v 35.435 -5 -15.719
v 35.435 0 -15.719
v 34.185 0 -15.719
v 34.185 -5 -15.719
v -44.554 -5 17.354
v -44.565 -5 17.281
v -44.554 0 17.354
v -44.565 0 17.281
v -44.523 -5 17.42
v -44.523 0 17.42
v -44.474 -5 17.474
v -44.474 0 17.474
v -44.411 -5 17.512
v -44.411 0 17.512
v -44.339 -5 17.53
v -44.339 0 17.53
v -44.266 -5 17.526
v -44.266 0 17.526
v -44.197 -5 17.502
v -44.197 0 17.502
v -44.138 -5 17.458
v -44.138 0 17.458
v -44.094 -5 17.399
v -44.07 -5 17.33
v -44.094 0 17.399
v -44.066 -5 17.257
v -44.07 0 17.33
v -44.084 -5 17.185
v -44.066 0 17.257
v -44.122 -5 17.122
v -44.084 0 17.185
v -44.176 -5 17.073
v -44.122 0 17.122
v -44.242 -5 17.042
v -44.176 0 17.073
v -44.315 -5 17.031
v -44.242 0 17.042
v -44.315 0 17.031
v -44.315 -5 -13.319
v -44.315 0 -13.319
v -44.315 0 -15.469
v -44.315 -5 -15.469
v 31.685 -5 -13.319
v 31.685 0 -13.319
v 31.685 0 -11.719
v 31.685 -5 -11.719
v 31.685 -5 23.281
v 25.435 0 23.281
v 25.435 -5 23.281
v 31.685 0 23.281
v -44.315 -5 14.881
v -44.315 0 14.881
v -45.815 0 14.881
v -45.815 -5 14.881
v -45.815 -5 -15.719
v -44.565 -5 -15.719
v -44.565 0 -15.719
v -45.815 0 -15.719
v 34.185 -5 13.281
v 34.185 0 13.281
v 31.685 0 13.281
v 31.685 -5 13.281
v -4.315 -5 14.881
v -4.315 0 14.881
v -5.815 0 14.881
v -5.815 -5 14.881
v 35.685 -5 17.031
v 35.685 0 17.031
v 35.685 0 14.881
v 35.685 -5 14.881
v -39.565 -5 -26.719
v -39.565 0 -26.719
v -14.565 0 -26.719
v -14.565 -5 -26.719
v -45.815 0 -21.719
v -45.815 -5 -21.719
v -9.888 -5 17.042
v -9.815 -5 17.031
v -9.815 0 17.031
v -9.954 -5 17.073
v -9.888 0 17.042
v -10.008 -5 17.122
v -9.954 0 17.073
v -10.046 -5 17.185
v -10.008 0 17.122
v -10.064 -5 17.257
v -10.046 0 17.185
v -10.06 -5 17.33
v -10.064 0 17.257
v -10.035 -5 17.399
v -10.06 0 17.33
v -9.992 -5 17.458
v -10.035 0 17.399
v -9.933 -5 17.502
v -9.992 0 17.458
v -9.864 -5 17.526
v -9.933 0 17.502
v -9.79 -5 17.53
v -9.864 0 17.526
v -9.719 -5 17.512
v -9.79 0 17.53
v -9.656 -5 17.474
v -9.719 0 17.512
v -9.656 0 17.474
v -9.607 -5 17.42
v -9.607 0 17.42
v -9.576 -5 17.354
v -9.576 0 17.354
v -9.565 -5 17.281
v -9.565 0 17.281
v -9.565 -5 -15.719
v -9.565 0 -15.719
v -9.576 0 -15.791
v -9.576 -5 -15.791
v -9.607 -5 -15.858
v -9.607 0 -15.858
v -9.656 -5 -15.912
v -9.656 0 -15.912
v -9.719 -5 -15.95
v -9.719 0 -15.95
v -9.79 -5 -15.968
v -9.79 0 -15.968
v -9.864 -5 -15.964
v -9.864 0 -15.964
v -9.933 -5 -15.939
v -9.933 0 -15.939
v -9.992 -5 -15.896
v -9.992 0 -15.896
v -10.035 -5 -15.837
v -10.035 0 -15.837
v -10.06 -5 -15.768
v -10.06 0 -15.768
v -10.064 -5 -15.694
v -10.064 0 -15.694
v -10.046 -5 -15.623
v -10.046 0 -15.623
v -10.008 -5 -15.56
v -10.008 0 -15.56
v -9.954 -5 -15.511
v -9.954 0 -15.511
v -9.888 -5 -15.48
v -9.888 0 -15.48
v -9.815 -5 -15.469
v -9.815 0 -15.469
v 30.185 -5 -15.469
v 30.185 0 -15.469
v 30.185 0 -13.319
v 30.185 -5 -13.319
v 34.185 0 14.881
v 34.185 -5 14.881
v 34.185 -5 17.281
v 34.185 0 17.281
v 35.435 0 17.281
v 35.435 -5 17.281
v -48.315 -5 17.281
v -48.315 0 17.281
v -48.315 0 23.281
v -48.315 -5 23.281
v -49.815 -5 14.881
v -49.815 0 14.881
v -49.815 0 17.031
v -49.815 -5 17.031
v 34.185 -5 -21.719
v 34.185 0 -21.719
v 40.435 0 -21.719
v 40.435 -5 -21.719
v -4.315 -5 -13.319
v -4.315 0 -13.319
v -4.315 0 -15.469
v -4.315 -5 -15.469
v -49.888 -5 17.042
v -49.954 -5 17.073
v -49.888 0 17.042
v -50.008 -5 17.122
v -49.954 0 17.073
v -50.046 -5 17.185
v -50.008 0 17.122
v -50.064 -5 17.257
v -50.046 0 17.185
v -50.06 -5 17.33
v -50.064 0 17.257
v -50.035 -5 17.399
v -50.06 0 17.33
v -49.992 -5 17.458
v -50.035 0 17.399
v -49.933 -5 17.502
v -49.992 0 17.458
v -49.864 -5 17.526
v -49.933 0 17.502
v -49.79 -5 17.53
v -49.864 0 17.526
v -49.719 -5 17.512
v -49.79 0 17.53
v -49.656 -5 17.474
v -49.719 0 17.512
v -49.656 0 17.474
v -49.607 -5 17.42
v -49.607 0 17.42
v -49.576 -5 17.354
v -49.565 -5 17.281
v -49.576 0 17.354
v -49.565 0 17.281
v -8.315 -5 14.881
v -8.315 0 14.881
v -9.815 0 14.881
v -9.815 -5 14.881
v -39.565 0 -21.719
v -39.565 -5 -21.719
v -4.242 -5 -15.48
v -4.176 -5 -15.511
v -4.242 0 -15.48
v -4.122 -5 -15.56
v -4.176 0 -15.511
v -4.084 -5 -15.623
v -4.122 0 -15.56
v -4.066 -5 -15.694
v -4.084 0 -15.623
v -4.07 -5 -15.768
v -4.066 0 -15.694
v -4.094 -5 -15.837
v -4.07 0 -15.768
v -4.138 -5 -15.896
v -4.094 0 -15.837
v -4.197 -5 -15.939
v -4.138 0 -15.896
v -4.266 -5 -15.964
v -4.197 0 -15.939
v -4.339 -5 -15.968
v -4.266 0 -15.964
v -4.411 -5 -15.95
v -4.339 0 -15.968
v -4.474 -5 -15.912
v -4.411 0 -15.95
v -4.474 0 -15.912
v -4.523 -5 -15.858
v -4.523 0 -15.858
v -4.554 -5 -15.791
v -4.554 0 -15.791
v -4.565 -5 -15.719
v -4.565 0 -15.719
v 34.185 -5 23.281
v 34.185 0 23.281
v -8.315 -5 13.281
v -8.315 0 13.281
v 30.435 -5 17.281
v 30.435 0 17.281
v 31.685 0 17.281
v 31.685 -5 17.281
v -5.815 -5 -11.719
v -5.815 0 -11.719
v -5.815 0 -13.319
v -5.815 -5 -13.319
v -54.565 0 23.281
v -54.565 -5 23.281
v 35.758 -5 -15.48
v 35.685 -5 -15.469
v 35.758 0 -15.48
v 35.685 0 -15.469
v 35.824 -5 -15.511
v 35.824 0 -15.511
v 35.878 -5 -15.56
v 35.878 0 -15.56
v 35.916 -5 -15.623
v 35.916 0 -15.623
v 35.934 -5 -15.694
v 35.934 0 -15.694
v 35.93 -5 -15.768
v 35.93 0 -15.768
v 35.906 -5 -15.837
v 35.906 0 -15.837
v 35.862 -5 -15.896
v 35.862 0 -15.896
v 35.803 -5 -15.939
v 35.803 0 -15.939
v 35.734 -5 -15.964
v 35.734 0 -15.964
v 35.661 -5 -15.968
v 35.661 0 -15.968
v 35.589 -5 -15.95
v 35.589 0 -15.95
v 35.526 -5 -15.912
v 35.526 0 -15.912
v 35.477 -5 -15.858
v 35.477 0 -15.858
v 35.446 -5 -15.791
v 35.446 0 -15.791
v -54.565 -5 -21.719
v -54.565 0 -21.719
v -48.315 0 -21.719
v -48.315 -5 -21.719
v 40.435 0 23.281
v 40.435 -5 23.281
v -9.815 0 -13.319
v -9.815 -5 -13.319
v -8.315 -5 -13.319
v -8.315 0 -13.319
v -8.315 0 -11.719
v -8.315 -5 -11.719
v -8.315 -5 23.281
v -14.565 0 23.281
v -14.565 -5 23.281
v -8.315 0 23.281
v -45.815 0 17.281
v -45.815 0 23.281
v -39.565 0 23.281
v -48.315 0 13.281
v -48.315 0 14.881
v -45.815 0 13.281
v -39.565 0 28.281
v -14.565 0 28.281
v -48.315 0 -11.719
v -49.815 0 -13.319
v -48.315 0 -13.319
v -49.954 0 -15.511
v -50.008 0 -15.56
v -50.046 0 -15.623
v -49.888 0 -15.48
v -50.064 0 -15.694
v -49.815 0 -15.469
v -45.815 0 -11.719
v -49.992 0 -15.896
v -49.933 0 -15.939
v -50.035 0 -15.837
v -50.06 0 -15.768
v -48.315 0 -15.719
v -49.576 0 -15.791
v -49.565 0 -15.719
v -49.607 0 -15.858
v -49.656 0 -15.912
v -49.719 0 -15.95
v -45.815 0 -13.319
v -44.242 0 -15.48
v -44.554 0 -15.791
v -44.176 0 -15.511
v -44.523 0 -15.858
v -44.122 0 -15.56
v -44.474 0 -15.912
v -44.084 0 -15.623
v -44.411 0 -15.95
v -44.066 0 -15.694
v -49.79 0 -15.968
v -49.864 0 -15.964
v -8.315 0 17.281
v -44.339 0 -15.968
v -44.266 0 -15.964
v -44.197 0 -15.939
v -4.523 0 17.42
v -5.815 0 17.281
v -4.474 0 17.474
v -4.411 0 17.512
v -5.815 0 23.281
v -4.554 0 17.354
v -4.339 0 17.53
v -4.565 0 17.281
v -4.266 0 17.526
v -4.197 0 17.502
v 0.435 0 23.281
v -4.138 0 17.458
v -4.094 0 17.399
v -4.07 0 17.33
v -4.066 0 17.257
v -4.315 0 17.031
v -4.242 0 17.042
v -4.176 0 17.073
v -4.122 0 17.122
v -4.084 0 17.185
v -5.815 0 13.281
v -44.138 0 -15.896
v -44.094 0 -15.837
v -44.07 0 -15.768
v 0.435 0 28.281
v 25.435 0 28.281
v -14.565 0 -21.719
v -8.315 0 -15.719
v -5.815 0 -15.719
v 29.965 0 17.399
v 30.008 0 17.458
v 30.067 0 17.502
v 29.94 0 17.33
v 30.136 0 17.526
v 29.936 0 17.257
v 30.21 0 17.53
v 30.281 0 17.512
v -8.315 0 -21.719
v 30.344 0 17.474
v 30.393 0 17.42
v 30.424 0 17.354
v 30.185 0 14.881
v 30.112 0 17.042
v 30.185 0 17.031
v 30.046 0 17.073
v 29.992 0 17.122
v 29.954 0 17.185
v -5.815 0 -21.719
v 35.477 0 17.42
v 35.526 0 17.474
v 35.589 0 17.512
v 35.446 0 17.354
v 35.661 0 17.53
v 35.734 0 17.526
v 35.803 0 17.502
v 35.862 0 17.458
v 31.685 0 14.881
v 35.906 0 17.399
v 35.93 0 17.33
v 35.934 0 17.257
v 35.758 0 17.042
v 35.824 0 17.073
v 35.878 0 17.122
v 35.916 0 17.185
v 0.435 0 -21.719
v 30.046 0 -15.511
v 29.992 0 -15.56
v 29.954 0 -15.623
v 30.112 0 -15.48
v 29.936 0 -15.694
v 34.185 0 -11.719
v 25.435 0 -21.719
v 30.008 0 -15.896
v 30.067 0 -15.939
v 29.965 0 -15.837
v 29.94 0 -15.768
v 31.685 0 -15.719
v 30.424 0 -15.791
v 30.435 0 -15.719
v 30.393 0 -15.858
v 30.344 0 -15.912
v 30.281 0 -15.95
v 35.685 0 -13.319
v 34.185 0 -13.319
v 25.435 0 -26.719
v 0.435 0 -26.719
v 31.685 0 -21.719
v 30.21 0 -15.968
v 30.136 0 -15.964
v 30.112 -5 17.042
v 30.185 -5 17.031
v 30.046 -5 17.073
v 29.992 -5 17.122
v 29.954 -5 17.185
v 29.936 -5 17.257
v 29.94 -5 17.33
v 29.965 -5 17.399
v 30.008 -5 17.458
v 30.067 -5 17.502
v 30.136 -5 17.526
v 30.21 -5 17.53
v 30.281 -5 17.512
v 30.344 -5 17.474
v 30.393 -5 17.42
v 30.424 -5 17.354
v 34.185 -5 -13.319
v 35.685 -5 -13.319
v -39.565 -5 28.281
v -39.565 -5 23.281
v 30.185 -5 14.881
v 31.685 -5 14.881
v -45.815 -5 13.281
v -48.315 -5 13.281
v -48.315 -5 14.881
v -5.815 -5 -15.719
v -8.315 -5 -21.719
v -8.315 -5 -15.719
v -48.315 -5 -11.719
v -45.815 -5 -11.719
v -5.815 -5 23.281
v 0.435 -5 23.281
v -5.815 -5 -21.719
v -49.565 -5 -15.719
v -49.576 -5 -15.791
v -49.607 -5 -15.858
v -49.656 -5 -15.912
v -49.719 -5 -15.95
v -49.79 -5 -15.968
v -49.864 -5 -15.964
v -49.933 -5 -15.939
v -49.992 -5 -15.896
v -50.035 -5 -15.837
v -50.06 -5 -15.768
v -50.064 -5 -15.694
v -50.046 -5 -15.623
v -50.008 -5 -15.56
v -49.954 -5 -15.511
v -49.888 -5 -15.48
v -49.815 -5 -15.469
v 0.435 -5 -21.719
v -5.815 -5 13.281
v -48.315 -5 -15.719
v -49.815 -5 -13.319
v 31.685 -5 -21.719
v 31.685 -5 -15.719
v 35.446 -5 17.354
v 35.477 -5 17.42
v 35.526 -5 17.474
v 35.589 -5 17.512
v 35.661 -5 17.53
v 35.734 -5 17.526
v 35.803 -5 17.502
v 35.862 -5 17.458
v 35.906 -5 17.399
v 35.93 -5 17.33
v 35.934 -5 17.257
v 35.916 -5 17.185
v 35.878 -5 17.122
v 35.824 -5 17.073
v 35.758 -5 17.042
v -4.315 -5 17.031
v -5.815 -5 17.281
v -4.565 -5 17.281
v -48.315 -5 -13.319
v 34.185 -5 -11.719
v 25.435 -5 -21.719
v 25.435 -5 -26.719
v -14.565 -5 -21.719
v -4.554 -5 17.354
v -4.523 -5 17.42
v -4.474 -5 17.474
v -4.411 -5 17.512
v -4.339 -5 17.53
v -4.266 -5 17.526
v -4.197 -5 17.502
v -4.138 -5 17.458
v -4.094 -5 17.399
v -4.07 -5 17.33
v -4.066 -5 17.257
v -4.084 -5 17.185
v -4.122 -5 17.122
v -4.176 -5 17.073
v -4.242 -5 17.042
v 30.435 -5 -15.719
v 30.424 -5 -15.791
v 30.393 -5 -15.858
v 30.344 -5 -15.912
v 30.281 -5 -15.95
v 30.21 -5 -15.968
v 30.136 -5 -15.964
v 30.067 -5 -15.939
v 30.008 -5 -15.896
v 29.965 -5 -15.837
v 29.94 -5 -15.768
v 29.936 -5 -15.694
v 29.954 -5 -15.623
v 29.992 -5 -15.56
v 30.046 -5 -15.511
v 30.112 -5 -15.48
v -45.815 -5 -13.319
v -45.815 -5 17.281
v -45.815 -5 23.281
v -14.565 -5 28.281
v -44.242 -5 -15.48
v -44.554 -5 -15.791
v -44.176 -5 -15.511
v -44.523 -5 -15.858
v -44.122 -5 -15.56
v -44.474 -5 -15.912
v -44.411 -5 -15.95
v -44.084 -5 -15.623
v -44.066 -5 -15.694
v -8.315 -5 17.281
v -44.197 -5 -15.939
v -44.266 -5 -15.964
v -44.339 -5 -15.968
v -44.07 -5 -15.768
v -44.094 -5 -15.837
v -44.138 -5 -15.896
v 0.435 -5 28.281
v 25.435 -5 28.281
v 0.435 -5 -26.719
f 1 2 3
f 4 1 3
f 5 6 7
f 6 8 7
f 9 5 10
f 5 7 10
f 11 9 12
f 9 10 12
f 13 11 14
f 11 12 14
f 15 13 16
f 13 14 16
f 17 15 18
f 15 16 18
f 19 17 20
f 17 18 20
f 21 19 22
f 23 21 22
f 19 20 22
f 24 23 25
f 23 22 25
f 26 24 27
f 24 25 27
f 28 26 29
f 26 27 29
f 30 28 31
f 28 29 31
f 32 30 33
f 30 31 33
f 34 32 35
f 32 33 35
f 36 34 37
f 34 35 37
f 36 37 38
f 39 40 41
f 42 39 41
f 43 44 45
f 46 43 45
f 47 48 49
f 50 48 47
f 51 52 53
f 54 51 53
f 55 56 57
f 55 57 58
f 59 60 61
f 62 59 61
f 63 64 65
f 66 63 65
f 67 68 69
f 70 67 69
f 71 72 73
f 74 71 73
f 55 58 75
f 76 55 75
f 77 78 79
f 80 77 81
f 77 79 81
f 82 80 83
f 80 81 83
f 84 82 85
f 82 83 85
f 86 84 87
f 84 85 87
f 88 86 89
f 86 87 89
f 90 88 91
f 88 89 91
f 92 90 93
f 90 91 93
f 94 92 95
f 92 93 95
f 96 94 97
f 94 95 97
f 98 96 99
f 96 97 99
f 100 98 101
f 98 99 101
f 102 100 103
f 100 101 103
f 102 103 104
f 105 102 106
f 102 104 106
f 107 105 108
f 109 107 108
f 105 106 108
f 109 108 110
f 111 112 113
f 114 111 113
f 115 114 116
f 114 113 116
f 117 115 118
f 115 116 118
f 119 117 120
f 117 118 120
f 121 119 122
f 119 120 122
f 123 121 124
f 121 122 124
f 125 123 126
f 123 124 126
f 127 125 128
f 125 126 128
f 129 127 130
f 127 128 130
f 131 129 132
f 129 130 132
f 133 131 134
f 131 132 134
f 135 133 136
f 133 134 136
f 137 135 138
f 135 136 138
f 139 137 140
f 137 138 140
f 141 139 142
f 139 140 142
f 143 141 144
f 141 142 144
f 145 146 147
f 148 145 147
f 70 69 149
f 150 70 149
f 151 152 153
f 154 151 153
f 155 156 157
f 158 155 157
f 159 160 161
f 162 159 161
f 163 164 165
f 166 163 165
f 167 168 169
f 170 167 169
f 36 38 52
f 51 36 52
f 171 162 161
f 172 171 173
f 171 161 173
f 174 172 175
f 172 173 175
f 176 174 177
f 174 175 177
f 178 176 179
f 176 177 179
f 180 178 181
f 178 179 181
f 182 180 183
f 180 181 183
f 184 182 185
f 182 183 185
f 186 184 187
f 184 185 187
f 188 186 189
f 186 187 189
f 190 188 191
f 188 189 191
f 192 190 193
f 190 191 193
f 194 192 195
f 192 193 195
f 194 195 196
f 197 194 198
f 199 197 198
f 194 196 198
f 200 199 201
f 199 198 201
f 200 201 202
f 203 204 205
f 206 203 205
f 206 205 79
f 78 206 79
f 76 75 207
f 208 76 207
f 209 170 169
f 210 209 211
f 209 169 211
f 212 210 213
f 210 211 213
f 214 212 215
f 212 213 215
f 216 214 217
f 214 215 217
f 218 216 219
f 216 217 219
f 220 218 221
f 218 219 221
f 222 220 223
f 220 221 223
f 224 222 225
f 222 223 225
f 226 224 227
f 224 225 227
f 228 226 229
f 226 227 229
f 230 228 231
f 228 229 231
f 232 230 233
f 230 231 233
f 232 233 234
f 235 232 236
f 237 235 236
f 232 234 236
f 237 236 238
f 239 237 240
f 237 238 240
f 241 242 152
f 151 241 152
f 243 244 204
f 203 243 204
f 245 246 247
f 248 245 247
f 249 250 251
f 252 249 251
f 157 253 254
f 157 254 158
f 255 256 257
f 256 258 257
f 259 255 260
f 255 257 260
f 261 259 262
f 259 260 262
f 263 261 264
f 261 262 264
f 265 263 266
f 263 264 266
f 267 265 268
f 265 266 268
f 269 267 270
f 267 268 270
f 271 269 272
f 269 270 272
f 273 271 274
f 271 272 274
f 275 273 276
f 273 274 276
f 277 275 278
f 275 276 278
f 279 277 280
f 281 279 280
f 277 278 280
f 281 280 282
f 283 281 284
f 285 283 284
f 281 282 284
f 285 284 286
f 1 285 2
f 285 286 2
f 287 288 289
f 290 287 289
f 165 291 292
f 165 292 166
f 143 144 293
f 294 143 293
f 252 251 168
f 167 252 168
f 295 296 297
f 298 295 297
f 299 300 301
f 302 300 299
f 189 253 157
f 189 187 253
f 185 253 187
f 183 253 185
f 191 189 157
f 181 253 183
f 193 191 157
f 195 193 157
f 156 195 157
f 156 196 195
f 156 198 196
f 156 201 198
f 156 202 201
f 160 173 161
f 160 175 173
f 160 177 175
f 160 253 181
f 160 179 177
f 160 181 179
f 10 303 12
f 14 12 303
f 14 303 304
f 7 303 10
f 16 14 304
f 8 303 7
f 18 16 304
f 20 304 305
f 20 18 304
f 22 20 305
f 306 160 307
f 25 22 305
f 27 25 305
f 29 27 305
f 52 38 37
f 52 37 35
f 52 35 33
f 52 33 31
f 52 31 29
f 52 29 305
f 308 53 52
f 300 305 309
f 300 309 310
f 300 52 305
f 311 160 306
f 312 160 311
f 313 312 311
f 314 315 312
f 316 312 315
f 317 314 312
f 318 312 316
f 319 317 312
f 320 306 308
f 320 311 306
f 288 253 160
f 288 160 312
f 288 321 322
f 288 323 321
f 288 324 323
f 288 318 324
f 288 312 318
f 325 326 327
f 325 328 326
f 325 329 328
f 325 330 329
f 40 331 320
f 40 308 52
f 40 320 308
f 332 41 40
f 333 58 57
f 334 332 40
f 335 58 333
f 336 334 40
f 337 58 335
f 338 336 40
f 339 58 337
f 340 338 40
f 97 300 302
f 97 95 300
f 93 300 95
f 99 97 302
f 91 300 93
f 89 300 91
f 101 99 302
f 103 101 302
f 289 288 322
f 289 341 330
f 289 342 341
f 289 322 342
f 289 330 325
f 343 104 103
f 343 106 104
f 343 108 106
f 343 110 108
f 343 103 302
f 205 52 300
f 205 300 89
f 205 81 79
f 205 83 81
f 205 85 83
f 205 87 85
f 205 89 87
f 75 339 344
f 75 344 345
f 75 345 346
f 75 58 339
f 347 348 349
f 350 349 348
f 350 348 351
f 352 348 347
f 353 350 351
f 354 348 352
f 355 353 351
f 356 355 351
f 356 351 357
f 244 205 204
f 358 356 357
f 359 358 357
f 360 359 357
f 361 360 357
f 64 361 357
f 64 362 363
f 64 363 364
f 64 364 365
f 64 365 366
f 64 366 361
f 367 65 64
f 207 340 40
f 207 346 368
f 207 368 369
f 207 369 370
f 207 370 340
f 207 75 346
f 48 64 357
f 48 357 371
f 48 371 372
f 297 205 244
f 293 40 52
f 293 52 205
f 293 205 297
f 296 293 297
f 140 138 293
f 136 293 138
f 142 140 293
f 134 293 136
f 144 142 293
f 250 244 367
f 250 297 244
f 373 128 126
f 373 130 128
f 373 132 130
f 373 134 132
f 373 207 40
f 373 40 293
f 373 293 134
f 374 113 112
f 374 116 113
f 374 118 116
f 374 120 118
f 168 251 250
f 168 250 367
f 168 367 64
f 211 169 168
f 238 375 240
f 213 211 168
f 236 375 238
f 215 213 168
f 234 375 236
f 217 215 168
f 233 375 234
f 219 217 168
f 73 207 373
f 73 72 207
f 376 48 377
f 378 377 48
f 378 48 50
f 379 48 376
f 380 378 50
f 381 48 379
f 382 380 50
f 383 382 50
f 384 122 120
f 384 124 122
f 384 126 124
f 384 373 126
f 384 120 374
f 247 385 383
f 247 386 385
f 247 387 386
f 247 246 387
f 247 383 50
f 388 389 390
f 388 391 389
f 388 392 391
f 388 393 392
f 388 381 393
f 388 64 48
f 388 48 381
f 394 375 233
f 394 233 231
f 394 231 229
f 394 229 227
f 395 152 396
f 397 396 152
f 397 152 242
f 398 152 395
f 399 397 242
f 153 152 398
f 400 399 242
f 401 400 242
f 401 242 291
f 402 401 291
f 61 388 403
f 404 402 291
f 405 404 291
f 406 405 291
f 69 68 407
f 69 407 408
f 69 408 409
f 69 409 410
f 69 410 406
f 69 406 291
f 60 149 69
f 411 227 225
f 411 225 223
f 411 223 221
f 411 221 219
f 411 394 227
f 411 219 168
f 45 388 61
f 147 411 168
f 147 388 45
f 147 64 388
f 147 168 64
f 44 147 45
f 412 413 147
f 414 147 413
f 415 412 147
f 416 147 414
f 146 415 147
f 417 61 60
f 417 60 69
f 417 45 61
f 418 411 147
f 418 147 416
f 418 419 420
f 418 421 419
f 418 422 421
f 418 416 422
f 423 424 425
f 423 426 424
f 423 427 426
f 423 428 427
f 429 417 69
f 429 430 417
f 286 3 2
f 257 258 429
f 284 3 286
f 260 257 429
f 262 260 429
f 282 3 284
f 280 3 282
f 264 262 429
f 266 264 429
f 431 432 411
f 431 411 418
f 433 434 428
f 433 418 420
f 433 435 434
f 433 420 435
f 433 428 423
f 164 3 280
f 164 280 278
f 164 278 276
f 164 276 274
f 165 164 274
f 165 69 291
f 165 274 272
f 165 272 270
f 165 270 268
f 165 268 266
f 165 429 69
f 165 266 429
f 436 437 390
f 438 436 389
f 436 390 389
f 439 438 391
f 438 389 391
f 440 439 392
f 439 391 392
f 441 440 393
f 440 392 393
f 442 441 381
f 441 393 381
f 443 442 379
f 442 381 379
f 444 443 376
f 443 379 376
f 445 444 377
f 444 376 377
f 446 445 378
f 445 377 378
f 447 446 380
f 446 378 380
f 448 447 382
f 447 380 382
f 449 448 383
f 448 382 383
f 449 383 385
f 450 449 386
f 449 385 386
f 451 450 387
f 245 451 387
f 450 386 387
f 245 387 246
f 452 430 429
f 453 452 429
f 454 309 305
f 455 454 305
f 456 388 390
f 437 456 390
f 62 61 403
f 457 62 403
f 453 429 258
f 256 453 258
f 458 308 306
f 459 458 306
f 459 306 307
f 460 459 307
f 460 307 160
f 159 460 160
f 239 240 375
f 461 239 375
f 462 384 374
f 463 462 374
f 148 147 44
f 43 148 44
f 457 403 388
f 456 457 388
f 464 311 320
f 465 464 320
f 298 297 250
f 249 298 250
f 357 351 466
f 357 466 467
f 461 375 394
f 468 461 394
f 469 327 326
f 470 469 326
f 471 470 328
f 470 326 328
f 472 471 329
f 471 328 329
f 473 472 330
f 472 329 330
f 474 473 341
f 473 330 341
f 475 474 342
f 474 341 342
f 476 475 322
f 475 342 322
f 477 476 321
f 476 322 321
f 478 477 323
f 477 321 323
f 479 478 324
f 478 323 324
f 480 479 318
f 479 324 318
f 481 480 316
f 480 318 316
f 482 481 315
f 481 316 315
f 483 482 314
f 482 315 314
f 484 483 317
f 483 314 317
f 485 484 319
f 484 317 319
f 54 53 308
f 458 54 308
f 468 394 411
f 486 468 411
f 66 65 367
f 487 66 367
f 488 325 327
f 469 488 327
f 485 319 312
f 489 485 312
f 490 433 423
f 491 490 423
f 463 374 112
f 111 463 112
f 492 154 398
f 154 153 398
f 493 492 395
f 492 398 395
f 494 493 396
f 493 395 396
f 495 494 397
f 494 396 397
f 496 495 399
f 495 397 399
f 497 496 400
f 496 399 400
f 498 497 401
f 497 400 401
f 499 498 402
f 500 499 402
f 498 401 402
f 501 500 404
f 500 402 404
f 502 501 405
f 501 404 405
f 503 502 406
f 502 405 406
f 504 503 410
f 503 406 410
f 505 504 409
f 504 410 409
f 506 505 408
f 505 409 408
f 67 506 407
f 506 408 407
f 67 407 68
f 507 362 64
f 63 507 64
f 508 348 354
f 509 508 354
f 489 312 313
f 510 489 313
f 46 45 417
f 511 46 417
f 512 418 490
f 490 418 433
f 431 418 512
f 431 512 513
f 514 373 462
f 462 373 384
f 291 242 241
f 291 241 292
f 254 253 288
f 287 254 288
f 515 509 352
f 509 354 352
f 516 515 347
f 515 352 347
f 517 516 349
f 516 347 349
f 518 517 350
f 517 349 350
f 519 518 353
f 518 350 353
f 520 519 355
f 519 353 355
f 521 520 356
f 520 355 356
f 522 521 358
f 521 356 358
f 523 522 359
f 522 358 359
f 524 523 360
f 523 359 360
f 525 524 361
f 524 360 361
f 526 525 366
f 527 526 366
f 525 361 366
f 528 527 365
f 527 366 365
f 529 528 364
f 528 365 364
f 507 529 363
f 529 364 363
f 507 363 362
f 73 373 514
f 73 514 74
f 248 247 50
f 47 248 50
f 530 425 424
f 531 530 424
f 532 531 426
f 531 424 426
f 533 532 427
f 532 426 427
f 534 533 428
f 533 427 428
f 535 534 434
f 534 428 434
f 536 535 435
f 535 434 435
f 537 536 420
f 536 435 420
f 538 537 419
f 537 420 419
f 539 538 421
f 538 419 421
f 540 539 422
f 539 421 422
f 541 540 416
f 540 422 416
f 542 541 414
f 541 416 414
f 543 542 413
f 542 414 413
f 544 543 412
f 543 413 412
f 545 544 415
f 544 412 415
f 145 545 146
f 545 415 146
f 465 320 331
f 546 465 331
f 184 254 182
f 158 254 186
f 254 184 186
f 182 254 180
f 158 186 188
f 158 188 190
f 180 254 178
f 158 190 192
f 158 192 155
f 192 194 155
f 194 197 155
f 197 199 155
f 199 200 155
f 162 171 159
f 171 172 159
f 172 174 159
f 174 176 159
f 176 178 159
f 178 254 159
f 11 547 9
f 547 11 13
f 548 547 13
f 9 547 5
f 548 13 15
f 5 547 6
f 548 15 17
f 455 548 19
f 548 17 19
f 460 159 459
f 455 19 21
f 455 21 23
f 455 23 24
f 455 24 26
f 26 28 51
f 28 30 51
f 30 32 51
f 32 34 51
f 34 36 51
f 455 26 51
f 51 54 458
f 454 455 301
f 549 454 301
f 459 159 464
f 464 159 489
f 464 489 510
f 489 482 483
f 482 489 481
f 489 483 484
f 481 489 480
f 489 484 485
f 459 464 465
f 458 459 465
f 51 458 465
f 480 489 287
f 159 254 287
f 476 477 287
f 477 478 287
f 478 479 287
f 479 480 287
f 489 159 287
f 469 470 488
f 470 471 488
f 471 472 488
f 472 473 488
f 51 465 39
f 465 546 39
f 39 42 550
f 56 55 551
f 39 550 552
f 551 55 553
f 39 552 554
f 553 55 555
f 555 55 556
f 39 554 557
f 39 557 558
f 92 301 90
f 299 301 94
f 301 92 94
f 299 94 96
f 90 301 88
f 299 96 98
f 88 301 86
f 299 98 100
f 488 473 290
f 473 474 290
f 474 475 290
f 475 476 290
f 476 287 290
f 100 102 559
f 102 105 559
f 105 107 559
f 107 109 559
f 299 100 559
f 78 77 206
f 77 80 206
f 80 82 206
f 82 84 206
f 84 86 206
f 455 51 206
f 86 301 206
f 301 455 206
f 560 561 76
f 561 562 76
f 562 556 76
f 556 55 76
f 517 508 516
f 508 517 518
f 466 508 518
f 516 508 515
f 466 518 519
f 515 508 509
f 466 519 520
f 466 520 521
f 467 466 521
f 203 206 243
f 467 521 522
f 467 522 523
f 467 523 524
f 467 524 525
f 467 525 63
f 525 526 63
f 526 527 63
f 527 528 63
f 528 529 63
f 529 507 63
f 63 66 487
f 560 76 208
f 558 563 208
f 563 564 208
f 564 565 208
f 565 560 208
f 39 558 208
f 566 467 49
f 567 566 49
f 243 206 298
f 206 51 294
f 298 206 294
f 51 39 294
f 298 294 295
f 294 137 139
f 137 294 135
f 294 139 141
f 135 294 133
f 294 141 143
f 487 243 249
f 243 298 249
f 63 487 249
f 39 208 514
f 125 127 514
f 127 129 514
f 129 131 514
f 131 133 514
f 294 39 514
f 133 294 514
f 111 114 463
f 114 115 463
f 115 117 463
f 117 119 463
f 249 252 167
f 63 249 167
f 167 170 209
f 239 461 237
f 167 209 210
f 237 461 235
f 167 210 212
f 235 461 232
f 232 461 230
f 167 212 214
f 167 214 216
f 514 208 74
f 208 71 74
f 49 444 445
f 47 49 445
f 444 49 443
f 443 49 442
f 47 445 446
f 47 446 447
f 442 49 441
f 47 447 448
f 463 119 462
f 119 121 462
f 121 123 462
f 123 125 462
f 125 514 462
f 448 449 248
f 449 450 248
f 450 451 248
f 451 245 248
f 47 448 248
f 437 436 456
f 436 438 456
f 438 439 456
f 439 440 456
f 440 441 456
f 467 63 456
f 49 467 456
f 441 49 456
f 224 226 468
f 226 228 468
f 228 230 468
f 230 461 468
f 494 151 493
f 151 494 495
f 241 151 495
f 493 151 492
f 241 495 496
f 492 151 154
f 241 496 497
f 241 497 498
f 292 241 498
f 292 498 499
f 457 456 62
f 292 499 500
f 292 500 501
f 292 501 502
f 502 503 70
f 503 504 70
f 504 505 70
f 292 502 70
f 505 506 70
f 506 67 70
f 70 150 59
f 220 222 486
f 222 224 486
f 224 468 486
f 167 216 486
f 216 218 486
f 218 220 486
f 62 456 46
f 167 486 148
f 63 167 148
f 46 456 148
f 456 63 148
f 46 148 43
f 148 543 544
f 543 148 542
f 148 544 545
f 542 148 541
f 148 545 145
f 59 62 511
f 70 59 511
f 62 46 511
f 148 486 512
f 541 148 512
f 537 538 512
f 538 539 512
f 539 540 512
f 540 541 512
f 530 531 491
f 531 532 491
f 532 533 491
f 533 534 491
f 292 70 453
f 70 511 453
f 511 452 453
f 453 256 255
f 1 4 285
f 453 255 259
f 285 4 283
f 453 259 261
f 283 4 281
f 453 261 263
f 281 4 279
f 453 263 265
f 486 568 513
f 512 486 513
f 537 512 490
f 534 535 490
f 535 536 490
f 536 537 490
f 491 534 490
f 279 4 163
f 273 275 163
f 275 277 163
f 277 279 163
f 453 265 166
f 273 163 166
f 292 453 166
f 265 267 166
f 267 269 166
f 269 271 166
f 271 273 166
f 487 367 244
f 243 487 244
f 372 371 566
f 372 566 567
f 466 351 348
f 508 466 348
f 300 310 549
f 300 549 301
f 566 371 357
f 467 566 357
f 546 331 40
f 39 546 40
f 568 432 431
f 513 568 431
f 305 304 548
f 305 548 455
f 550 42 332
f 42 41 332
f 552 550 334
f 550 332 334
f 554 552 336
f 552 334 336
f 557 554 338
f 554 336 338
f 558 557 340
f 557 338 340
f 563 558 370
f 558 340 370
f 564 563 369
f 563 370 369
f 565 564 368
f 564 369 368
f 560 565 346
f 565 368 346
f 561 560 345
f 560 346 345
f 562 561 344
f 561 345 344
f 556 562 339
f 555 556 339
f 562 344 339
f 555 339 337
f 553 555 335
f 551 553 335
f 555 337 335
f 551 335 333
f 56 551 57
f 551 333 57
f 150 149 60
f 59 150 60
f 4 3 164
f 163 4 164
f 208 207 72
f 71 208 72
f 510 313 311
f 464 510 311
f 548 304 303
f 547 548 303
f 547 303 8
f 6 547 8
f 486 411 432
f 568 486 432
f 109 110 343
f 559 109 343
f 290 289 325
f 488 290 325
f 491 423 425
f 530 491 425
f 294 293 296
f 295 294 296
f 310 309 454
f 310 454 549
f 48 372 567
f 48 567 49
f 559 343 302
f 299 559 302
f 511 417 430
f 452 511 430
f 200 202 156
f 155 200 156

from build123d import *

# Parameters (mm, degrees)
SCHIZZO1_W                   = 95
SCHIZZO1_H                   = 55
ESTRUSIONE_ESTRUSIONE2_DEPTH = 5
SCHIZZO2_W                   = 15
SCHIZZO2_H                   = 5
TAGLIO_ESTRUSIONE1_DEPTH     = 6
TAGLIO_ESTRUSIONE3_DEPTH     = 6
SCHIZZO4_R                   = 0.25
TAGLIO_ESTRUSIONE4_DEPTH     = 10


with BuildPart() as part:
    # Schizzo1 → Estrusione-Estrusione2 (new body)
    with BuildSketch(Plane(origin=(0, 0, 0), x_dir=(1, 0, 0), z_dir=(0, 1, 0))):
        with Locations((-7.06494914, -0.781075862)):
            Rectangle(SCHIZZO1_W, SCHIZZO1_H)
    extrude(amount=-ESTRUSIONE_ESTRUSIONE2_DEPTH)

    # Schizzo2 → Taglio-Estrusione1 (cut, through all)
    with BuildSketch(Plane(origin=(0, 0, 0), x_dir=(1, 0, 0), z_dir=(0, 1, 0))):
        with Locations((-47.06494914, -25.781075862)):
            Rectangle(SCHIZZO2_W, SCHIZZO2_H)
        with Locations((-47.06494914, 24.218924138)):
            Rectangle(SCHIZZO2_W, SCHIZZO2_H)
        with Locations((32.93505086, -25.781075862)):
            Rectangle(SCHIZZO2_W, SCHIZZO2_H)
        with Locations((32.93505086, 24.218924138)):
            Rectangle(SCHIZZO2_W, SCHIZZO2_H)
        with Locations((-7.06494914, -25.781075862)):
            Rectangle(SCHIZZO2_W, SCHIZZO2_H)
        with Locations((-7.06494914, 24.218924138)):
            Rectangle(SCHIZZO2_W, SCHIZZO2_H)
    extrude(amount=-TAGLIO_ESTRUSIONE1_DEPTH, mode=Mode.SUBTRACT)

    # Schizzo3 → Taglio-Estrusione3 (cut, through all)
    with BuildSketch(Plane(origin=(0, 0, 0), x_dir=(1, 0, 0), z_dir=(0, 1, 0))):
        Polygon((-48.31494914, -23.281075862), (-45.81494914, -23.281075862), (-45.81494914, -17.281075862), (-44.31494914, -17.281075862), (-44.31494914, -14.881075862), (-45.81494914, -14.881075862), (-45.81494914, -13.281075862), (-48.31494914, -13.281075862), (-48.31494914, -14.881075862), (-49.81494914, -14.881075862), (-49.81494914, -17.281075862), (-48.31494914, -17.281075862), align=None)
        Polygon((-8.31494914, -23.281075862), (-5.81494914, -23.281075862), (-5.81494914, -17.281075862), (-4.31494914, -17.281075862), (-4.31494914, -14.881075862), (-5.81494914, -14.881075862), (-5.81494914, -13.281075862), (-8.31494914, -13.281075862), (-8.31494914, -14.881075862), (-9.81494914, -14.881075862), (-9.81494914, -17.281075862), (-8.31494914, -17.281075862), align=None)
        Polygon((31.68505086, -23.281075862), (34.18505086, -23.281075862), (34.18505086, -17.281075862), (35.68505086, -17.281075862), (35.68505086, -14.881075862), (34.18505086, -14.881075862), (34.18505086, -13.281075862), (31.68505086, -13.281075862), (31.68505086, -14.881075862), (30.18505086, -14.881075862), (30.18505086, -17.281075862), (31.68505086, -17.281075862), align=None)
        Polygon((31.68505086, 11.718924138), (34.18505086, 11.718924138), (34.18505086, 13.318924138), (35.68505086, 13.318924138), (35.68505086, 15.718924138), (34.18505086, 15.718924138), (34.18505086, 21.718924138), (31.68505086, 21.718924138), (31.68505086, 15.718924138), (30.18505086, 15.718924138), (30.18505086, 13.318924138), (31.68505086, 13.318924138), align=None)
        Polygon((-8.31494914, 11.718924138), (-5.81494914, 11.718924138), (-5.81494914, 13.318924138), (-4.31494914, 13.318924138), (-4.31494914, 15.718924138), (-5.81494914, 15.718924138), (-5.81494914, 21.718924138), (-8.31494914, 21.718924138), (-8.31494914, 15.718924138), (-9.81494914, 15.718924138), (-9.81494914, 13.318924138), (-8.31494914, 13.318924138), align=None)
        Polygon((-48.31494914, 11.718924138), (-45.81494914, 11.718924138), (-45.81494914, 13.318924138), (-44.31494914, 13.318924138), (-44.31494914, 15.718924138), (-45.81494914, 15.718924138), (-45.81494914, 21.718924138), (-48.31494914, 21.718924138), (-48.31494914, 15.718924138), (-49.81494914, 15.718924138), (-49.81494914, 13.318924138), (-48.31494914, 13.318924138), align=None)
    extrude(amount=-TAGLIO_ESTRUSIONE3_DEPTH, mode=Mode.SUBTRACT)

    # Schizzo4 → Taglio-Estrusione4 (cut)
    with BuildSketch(Plane(origin=(0, 0, 0), x_dir=(1, 0, 0), z_dir=(0, 1, 0))):
        with Locations((-49.81494914, -17.281075862)):
            Circle(SCHIZZO4_R)
        with Locations((-44.31494914, -17.281075862)):
            Circle(SCHIZZO4_R)
        with Locations((-9.81494914, -17.281075862)):
            Circle(SCHIZZO4_R)
        with Locations((-4.31494914, -17.281075862)):
            Circle(SCHIZZO4_R)
        with Locations((30.18505086, -17.281075862)):
            Circle(SCHIZZO4_R)
        with Locations((35.68505086, -17.281075862)):
            Circle(SCHIZZO4_R)
        with Locations((-49.81494914, 15.718924138)):
            Circle(SCHIZZO4_R)
        with Locations((-44.31494914, 15.718924138)):
            Circle(SCHIZZO4_R)
        with Locations((-9.81494914, 15.718924138)):
            Circle(SCHIZZO4_R)
        with Locations((-4.31494914, 15.718924138)):
            Circle(SCHIZZO4_R)
        with Locations((30.18505086, 15.718924138)):
            Circle(SCHIZZO4_R)
        with Locations((35.68505086, 15.718924138)):
            Circle(SCHIZZO4_R)
    extrude(amount=-TAGLIO_ESTRUSIONE4_DEPTH, mode=Mode.SUBTRACT)


solid = part.part
